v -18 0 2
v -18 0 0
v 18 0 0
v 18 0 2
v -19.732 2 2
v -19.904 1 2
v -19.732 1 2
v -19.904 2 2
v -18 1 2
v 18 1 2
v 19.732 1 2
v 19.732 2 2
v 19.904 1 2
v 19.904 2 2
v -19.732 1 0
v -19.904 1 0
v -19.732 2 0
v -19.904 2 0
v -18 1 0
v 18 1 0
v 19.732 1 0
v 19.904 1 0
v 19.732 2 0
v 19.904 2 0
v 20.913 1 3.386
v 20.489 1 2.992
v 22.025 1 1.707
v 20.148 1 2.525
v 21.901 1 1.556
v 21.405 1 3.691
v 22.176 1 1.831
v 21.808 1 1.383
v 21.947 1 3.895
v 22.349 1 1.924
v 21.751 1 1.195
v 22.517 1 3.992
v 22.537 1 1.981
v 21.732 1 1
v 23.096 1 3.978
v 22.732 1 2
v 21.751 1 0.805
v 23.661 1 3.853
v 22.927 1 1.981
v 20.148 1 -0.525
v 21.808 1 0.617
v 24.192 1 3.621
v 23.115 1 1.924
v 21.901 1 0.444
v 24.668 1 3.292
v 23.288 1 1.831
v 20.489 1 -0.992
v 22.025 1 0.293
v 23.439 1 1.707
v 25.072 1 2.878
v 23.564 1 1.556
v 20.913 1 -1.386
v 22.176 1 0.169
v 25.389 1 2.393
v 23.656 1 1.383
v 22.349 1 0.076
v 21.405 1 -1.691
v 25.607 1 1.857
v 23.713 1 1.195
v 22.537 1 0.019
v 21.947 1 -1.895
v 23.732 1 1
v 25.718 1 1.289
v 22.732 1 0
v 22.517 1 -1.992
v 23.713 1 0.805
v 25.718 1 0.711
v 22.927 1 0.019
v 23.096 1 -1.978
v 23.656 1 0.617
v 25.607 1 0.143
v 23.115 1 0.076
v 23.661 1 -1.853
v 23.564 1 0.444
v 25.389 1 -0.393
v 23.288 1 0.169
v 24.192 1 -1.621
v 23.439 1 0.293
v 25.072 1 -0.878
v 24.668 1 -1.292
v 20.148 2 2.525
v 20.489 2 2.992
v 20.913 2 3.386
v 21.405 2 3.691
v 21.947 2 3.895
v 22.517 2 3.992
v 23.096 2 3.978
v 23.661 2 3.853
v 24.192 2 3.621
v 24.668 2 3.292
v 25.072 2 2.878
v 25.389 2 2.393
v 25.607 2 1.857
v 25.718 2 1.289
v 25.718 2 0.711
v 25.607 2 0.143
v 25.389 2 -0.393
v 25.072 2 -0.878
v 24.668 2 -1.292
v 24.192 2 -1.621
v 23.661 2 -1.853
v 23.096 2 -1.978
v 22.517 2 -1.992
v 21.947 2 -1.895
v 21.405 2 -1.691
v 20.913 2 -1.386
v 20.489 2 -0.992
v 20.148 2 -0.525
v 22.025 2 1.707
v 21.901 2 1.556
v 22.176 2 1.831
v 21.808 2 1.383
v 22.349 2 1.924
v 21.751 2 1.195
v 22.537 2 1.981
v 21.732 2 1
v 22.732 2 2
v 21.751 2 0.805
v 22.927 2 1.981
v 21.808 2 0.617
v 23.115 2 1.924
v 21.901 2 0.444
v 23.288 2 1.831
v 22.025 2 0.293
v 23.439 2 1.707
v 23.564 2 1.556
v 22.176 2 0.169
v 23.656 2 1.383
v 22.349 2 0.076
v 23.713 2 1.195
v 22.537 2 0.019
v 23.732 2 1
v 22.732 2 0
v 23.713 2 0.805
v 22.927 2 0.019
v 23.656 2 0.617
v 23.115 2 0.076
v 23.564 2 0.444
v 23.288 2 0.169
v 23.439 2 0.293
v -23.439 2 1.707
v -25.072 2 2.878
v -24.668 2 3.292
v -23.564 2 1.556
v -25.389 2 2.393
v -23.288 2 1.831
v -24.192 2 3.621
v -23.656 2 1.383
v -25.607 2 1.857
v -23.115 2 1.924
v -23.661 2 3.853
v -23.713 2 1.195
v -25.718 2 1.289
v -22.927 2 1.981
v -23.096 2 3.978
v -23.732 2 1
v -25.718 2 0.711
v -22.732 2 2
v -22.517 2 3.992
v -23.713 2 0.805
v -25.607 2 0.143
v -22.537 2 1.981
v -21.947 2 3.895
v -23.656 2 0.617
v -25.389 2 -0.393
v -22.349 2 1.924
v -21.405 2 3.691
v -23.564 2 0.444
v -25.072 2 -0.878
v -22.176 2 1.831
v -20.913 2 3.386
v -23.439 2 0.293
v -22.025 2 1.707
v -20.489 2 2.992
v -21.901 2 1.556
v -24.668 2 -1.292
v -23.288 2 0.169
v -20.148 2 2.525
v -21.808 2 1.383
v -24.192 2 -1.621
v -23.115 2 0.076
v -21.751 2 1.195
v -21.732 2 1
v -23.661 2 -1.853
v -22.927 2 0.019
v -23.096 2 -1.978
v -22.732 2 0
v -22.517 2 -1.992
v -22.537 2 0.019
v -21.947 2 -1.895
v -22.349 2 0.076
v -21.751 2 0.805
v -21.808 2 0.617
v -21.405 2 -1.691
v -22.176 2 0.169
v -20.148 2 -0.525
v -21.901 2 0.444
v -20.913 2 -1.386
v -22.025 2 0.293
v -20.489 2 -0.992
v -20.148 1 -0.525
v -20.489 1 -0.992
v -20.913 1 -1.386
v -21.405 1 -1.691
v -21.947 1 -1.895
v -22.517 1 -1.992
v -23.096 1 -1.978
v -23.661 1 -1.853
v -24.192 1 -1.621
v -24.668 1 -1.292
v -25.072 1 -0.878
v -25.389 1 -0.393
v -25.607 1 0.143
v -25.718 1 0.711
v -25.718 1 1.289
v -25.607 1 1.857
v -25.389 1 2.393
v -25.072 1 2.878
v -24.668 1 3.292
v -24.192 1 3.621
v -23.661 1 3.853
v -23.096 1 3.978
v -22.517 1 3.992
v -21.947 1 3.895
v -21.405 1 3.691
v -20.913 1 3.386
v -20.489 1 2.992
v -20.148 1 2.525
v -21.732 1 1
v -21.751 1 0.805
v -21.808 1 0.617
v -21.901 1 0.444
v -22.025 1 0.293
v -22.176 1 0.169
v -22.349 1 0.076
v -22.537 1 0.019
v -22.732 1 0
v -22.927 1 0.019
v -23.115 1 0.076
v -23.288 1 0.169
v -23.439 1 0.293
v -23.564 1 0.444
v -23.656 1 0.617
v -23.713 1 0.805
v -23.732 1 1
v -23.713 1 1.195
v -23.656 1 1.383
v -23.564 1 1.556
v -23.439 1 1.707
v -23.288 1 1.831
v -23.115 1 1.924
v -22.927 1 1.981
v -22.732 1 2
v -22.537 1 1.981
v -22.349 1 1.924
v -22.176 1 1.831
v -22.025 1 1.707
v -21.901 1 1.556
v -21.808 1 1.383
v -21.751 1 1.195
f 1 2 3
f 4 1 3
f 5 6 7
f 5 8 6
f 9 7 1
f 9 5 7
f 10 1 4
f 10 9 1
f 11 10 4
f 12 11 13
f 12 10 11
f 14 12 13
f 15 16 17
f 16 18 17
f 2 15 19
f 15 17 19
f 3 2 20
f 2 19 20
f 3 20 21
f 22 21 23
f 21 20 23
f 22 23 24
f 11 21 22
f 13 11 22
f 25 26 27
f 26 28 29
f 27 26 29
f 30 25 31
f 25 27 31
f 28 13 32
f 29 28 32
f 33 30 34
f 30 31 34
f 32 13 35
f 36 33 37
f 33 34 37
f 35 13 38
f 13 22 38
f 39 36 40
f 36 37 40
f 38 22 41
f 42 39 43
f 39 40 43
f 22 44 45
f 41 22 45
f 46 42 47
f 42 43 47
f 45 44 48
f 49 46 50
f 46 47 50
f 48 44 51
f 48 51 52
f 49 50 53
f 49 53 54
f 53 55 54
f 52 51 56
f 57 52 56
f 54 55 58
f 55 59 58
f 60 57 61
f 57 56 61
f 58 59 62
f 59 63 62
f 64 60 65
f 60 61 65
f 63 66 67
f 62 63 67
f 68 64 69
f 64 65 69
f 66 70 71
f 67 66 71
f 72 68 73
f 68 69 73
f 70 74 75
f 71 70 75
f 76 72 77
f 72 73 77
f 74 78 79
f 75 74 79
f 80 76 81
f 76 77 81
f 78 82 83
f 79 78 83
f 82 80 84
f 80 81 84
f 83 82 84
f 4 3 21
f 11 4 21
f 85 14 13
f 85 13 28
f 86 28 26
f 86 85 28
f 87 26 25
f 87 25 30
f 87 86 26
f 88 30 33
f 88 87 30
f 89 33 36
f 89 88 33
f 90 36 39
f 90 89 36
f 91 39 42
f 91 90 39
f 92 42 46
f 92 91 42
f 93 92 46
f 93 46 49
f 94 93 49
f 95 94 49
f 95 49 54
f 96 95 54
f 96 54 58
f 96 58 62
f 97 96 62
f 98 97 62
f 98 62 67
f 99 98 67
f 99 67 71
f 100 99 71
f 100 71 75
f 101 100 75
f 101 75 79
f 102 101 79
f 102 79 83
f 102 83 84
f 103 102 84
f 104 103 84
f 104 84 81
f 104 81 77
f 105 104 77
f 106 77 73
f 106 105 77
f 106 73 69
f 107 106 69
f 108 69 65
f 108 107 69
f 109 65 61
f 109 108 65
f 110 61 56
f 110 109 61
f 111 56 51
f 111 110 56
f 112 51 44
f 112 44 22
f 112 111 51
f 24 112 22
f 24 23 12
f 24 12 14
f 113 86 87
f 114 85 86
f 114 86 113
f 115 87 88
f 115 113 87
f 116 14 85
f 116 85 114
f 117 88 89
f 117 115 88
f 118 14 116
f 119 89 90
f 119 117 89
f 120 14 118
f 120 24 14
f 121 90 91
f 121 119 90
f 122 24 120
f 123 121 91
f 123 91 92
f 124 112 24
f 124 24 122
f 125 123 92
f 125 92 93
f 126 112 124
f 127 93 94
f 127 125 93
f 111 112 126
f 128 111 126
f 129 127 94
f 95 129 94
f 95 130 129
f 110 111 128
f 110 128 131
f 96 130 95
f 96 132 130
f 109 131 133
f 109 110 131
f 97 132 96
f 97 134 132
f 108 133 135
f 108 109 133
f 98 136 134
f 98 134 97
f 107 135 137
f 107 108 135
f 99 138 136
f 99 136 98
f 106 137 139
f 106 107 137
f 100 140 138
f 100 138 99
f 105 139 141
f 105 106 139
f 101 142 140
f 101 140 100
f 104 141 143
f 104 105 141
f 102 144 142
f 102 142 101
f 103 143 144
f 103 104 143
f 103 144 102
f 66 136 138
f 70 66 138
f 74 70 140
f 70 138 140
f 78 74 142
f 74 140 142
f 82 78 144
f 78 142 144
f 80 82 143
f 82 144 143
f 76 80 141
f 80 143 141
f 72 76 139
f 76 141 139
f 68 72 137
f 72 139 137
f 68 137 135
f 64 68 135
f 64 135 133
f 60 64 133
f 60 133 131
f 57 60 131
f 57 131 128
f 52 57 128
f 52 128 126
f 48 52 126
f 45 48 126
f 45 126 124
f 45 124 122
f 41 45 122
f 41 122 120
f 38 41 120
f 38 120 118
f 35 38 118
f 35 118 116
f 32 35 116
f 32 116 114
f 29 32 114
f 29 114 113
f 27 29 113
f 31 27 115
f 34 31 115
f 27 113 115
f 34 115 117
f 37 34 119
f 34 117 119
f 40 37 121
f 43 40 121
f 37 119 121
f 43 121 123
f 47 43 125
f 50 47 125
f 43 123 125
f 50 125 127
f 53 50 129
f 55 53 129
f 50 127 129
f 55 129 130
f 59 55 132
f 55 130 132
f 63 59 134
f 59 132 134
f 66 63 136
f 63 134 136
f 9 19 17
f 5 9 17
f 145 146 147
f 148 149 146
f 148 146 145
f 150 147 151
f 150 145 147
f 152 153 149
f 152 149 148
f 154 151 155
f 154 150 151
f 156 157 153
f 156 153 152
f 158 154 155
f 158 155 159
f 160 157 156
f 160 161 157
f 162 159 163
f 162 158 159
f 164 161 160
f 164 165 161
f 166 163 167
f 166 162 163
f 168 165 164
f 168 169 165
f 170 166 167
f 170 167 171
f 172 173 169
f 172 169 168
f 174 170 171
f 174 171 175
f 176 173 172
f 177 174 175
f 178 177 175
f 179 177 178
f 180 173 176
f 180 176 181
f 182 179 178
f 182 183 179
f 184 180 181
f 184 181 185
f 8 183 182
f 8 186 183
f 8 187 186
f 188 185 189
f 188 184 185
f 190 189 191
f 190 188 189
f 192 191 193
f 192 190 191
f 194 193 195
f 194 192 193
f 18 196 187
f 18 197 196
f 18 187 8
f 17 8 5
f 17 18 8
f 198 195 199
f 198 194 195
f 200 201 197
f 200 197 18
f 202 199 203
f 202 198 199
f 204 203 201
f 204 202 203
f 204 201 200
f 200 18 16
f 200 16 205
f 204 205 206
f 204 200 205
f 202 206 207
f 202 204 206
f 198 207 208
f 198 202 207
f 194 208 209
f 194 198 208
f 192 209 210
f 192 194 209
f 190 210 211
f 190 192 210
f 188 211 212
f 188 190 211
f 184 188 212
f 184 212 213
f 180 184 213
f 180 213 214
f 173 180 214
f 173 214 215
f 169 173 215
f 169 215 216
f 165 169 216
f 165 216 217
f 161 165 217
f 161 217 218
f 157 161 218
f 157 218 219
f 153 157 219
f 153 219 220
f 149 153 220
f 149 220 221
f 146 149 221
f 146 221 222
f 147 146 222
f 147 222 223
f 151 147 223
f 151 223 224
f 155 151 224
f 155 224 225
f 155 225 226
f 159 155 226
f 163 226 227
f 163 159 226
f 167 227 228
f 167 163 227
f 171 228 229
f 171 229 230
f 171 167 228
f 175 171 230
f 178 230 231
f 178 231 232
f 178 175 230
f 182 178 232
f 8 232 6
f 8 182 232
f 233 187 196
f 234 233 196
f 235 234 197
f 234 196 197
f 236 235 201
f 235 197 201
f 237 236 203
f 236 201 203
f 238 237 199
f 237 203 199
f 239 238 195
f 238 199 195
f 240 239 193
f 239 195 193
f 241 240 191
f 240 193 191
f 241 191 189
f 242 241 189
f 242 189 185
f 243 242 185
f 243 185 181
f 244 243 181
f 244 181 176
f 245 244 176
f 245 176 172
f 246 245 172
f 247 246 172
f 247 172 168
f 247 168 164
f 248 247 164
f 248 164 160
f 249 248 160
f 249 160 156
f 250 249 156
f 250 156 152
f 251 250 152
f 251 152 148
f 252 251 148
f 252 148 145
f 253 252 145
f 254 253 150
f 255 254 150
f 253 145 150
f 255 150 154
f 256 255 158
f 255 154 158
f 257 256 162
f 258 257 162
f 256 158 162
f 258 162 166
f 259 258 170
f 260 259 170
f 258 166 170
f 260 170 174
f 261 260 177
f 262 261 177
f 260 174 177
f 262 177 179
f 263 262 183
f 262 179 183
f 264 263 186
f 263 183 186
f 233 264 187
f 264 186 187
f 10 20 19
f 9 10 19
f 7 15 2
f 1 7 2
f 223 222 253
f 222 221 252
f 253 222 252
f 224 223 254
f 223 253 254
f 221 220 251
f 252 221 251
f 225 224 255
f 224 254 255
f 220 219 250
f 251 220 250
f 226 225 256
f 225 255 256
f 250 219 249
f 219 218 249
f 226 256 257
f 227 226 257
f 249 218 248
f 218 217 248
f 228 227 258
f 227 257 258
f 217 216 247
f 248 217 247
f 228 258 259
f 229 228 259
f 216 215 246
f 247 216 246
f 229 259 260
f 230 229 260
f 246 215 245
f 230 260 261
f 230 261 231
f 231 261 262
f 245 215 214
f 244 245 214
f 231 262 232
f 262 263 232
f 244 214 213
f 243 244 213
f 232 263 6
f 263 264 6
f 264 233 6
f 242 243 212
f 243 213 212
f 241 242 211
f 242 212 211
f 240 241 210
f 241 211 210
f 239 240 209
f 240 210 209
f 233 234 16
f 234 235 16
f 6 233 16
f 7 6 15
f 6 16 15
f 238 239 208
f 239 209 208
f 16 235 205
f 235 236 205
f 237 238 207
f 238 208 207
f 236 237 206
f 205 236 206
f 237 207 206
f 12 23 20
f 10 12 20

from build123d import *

# Parameters (mm, degrees)
BOSS_EXTRUDE1_DEPTH     = 2
SKETCH3_R               = 3
BOSS_EXTRUDE2_DEPTH     = 1
SKETCH4_R               = 3
BOSS_EXTRUDE3_DEPTH     = 1
SKETCH5_R               = 1
CUT_EXTRUDE5_DEPTH      = 1
CUT_EXTRUDE5_DEPTH_BACK = 3


with BuildPart() as part:
    # Sketch2 → Boss-Extrude1 (new body)
    with BuildSketch(Plane.XY):
        Polygon((-18, 0), (18, 0), (19.732050808, 1), (20.970146046, 1), (20.970146046, 2), (19.732050808, 2), (18, 1), (-18, 1), (-19.732050808, 2), (-20.970146046, 2), (-20.970146046, 1), (-19.732050808, 1), align=None)
    extrude(amount=BOSS_EXTRUDE1_DEPTH)

    # Sketch3 → Boss-Extrude2 (add)
    with BuildSketch(Plane(origin=(0, 2, 0), x_dir=(1, 0, 0), z_dir=(0, 1, 0))):
        with Locations((-22.732050808, -1)):
            Circle(SKETCH3_R)
    extrude(amount=-BOSS_EXTRUDE2_DEPTH)

    # Sketch4 → Boss-Extrude3 (add)
    with BuildSketch(Plane(origin=(0, 2, 0), x_dir=(1, 0, 0), z_dir=(0, 1, 0))):
        with Locations((22.732050808, -1)):
            Circle(SKETCH4_R)
    extrude(amount=-BOSS_EXTRUDE3_DEPTH)

    # Sketch5 → Cut-Extrude5 (cut, two sides)
    with BuildSketch(Plane(origin=(0, 2, 0), x_dir=(1, 0, 0), z_dir=(0, 1, 0))) as cut_extrude5_sk:
        with Locations((-22.732050808, -1)):
            Circle(SKETCH5_R)
        with Locations((22.732050808, -1)):
            Circle(SKETCH5_R)
    extrude(amount=CUT_EXTRUDE5_DEPTH, mode=Mode.SUBTRACT)
    extrude(cut_extrude5_sk.sketch, amount=-CUT_EXTRUDE5_DEPTH_BACK, mode=Mode.SUBTRACT)


solid = part.part
